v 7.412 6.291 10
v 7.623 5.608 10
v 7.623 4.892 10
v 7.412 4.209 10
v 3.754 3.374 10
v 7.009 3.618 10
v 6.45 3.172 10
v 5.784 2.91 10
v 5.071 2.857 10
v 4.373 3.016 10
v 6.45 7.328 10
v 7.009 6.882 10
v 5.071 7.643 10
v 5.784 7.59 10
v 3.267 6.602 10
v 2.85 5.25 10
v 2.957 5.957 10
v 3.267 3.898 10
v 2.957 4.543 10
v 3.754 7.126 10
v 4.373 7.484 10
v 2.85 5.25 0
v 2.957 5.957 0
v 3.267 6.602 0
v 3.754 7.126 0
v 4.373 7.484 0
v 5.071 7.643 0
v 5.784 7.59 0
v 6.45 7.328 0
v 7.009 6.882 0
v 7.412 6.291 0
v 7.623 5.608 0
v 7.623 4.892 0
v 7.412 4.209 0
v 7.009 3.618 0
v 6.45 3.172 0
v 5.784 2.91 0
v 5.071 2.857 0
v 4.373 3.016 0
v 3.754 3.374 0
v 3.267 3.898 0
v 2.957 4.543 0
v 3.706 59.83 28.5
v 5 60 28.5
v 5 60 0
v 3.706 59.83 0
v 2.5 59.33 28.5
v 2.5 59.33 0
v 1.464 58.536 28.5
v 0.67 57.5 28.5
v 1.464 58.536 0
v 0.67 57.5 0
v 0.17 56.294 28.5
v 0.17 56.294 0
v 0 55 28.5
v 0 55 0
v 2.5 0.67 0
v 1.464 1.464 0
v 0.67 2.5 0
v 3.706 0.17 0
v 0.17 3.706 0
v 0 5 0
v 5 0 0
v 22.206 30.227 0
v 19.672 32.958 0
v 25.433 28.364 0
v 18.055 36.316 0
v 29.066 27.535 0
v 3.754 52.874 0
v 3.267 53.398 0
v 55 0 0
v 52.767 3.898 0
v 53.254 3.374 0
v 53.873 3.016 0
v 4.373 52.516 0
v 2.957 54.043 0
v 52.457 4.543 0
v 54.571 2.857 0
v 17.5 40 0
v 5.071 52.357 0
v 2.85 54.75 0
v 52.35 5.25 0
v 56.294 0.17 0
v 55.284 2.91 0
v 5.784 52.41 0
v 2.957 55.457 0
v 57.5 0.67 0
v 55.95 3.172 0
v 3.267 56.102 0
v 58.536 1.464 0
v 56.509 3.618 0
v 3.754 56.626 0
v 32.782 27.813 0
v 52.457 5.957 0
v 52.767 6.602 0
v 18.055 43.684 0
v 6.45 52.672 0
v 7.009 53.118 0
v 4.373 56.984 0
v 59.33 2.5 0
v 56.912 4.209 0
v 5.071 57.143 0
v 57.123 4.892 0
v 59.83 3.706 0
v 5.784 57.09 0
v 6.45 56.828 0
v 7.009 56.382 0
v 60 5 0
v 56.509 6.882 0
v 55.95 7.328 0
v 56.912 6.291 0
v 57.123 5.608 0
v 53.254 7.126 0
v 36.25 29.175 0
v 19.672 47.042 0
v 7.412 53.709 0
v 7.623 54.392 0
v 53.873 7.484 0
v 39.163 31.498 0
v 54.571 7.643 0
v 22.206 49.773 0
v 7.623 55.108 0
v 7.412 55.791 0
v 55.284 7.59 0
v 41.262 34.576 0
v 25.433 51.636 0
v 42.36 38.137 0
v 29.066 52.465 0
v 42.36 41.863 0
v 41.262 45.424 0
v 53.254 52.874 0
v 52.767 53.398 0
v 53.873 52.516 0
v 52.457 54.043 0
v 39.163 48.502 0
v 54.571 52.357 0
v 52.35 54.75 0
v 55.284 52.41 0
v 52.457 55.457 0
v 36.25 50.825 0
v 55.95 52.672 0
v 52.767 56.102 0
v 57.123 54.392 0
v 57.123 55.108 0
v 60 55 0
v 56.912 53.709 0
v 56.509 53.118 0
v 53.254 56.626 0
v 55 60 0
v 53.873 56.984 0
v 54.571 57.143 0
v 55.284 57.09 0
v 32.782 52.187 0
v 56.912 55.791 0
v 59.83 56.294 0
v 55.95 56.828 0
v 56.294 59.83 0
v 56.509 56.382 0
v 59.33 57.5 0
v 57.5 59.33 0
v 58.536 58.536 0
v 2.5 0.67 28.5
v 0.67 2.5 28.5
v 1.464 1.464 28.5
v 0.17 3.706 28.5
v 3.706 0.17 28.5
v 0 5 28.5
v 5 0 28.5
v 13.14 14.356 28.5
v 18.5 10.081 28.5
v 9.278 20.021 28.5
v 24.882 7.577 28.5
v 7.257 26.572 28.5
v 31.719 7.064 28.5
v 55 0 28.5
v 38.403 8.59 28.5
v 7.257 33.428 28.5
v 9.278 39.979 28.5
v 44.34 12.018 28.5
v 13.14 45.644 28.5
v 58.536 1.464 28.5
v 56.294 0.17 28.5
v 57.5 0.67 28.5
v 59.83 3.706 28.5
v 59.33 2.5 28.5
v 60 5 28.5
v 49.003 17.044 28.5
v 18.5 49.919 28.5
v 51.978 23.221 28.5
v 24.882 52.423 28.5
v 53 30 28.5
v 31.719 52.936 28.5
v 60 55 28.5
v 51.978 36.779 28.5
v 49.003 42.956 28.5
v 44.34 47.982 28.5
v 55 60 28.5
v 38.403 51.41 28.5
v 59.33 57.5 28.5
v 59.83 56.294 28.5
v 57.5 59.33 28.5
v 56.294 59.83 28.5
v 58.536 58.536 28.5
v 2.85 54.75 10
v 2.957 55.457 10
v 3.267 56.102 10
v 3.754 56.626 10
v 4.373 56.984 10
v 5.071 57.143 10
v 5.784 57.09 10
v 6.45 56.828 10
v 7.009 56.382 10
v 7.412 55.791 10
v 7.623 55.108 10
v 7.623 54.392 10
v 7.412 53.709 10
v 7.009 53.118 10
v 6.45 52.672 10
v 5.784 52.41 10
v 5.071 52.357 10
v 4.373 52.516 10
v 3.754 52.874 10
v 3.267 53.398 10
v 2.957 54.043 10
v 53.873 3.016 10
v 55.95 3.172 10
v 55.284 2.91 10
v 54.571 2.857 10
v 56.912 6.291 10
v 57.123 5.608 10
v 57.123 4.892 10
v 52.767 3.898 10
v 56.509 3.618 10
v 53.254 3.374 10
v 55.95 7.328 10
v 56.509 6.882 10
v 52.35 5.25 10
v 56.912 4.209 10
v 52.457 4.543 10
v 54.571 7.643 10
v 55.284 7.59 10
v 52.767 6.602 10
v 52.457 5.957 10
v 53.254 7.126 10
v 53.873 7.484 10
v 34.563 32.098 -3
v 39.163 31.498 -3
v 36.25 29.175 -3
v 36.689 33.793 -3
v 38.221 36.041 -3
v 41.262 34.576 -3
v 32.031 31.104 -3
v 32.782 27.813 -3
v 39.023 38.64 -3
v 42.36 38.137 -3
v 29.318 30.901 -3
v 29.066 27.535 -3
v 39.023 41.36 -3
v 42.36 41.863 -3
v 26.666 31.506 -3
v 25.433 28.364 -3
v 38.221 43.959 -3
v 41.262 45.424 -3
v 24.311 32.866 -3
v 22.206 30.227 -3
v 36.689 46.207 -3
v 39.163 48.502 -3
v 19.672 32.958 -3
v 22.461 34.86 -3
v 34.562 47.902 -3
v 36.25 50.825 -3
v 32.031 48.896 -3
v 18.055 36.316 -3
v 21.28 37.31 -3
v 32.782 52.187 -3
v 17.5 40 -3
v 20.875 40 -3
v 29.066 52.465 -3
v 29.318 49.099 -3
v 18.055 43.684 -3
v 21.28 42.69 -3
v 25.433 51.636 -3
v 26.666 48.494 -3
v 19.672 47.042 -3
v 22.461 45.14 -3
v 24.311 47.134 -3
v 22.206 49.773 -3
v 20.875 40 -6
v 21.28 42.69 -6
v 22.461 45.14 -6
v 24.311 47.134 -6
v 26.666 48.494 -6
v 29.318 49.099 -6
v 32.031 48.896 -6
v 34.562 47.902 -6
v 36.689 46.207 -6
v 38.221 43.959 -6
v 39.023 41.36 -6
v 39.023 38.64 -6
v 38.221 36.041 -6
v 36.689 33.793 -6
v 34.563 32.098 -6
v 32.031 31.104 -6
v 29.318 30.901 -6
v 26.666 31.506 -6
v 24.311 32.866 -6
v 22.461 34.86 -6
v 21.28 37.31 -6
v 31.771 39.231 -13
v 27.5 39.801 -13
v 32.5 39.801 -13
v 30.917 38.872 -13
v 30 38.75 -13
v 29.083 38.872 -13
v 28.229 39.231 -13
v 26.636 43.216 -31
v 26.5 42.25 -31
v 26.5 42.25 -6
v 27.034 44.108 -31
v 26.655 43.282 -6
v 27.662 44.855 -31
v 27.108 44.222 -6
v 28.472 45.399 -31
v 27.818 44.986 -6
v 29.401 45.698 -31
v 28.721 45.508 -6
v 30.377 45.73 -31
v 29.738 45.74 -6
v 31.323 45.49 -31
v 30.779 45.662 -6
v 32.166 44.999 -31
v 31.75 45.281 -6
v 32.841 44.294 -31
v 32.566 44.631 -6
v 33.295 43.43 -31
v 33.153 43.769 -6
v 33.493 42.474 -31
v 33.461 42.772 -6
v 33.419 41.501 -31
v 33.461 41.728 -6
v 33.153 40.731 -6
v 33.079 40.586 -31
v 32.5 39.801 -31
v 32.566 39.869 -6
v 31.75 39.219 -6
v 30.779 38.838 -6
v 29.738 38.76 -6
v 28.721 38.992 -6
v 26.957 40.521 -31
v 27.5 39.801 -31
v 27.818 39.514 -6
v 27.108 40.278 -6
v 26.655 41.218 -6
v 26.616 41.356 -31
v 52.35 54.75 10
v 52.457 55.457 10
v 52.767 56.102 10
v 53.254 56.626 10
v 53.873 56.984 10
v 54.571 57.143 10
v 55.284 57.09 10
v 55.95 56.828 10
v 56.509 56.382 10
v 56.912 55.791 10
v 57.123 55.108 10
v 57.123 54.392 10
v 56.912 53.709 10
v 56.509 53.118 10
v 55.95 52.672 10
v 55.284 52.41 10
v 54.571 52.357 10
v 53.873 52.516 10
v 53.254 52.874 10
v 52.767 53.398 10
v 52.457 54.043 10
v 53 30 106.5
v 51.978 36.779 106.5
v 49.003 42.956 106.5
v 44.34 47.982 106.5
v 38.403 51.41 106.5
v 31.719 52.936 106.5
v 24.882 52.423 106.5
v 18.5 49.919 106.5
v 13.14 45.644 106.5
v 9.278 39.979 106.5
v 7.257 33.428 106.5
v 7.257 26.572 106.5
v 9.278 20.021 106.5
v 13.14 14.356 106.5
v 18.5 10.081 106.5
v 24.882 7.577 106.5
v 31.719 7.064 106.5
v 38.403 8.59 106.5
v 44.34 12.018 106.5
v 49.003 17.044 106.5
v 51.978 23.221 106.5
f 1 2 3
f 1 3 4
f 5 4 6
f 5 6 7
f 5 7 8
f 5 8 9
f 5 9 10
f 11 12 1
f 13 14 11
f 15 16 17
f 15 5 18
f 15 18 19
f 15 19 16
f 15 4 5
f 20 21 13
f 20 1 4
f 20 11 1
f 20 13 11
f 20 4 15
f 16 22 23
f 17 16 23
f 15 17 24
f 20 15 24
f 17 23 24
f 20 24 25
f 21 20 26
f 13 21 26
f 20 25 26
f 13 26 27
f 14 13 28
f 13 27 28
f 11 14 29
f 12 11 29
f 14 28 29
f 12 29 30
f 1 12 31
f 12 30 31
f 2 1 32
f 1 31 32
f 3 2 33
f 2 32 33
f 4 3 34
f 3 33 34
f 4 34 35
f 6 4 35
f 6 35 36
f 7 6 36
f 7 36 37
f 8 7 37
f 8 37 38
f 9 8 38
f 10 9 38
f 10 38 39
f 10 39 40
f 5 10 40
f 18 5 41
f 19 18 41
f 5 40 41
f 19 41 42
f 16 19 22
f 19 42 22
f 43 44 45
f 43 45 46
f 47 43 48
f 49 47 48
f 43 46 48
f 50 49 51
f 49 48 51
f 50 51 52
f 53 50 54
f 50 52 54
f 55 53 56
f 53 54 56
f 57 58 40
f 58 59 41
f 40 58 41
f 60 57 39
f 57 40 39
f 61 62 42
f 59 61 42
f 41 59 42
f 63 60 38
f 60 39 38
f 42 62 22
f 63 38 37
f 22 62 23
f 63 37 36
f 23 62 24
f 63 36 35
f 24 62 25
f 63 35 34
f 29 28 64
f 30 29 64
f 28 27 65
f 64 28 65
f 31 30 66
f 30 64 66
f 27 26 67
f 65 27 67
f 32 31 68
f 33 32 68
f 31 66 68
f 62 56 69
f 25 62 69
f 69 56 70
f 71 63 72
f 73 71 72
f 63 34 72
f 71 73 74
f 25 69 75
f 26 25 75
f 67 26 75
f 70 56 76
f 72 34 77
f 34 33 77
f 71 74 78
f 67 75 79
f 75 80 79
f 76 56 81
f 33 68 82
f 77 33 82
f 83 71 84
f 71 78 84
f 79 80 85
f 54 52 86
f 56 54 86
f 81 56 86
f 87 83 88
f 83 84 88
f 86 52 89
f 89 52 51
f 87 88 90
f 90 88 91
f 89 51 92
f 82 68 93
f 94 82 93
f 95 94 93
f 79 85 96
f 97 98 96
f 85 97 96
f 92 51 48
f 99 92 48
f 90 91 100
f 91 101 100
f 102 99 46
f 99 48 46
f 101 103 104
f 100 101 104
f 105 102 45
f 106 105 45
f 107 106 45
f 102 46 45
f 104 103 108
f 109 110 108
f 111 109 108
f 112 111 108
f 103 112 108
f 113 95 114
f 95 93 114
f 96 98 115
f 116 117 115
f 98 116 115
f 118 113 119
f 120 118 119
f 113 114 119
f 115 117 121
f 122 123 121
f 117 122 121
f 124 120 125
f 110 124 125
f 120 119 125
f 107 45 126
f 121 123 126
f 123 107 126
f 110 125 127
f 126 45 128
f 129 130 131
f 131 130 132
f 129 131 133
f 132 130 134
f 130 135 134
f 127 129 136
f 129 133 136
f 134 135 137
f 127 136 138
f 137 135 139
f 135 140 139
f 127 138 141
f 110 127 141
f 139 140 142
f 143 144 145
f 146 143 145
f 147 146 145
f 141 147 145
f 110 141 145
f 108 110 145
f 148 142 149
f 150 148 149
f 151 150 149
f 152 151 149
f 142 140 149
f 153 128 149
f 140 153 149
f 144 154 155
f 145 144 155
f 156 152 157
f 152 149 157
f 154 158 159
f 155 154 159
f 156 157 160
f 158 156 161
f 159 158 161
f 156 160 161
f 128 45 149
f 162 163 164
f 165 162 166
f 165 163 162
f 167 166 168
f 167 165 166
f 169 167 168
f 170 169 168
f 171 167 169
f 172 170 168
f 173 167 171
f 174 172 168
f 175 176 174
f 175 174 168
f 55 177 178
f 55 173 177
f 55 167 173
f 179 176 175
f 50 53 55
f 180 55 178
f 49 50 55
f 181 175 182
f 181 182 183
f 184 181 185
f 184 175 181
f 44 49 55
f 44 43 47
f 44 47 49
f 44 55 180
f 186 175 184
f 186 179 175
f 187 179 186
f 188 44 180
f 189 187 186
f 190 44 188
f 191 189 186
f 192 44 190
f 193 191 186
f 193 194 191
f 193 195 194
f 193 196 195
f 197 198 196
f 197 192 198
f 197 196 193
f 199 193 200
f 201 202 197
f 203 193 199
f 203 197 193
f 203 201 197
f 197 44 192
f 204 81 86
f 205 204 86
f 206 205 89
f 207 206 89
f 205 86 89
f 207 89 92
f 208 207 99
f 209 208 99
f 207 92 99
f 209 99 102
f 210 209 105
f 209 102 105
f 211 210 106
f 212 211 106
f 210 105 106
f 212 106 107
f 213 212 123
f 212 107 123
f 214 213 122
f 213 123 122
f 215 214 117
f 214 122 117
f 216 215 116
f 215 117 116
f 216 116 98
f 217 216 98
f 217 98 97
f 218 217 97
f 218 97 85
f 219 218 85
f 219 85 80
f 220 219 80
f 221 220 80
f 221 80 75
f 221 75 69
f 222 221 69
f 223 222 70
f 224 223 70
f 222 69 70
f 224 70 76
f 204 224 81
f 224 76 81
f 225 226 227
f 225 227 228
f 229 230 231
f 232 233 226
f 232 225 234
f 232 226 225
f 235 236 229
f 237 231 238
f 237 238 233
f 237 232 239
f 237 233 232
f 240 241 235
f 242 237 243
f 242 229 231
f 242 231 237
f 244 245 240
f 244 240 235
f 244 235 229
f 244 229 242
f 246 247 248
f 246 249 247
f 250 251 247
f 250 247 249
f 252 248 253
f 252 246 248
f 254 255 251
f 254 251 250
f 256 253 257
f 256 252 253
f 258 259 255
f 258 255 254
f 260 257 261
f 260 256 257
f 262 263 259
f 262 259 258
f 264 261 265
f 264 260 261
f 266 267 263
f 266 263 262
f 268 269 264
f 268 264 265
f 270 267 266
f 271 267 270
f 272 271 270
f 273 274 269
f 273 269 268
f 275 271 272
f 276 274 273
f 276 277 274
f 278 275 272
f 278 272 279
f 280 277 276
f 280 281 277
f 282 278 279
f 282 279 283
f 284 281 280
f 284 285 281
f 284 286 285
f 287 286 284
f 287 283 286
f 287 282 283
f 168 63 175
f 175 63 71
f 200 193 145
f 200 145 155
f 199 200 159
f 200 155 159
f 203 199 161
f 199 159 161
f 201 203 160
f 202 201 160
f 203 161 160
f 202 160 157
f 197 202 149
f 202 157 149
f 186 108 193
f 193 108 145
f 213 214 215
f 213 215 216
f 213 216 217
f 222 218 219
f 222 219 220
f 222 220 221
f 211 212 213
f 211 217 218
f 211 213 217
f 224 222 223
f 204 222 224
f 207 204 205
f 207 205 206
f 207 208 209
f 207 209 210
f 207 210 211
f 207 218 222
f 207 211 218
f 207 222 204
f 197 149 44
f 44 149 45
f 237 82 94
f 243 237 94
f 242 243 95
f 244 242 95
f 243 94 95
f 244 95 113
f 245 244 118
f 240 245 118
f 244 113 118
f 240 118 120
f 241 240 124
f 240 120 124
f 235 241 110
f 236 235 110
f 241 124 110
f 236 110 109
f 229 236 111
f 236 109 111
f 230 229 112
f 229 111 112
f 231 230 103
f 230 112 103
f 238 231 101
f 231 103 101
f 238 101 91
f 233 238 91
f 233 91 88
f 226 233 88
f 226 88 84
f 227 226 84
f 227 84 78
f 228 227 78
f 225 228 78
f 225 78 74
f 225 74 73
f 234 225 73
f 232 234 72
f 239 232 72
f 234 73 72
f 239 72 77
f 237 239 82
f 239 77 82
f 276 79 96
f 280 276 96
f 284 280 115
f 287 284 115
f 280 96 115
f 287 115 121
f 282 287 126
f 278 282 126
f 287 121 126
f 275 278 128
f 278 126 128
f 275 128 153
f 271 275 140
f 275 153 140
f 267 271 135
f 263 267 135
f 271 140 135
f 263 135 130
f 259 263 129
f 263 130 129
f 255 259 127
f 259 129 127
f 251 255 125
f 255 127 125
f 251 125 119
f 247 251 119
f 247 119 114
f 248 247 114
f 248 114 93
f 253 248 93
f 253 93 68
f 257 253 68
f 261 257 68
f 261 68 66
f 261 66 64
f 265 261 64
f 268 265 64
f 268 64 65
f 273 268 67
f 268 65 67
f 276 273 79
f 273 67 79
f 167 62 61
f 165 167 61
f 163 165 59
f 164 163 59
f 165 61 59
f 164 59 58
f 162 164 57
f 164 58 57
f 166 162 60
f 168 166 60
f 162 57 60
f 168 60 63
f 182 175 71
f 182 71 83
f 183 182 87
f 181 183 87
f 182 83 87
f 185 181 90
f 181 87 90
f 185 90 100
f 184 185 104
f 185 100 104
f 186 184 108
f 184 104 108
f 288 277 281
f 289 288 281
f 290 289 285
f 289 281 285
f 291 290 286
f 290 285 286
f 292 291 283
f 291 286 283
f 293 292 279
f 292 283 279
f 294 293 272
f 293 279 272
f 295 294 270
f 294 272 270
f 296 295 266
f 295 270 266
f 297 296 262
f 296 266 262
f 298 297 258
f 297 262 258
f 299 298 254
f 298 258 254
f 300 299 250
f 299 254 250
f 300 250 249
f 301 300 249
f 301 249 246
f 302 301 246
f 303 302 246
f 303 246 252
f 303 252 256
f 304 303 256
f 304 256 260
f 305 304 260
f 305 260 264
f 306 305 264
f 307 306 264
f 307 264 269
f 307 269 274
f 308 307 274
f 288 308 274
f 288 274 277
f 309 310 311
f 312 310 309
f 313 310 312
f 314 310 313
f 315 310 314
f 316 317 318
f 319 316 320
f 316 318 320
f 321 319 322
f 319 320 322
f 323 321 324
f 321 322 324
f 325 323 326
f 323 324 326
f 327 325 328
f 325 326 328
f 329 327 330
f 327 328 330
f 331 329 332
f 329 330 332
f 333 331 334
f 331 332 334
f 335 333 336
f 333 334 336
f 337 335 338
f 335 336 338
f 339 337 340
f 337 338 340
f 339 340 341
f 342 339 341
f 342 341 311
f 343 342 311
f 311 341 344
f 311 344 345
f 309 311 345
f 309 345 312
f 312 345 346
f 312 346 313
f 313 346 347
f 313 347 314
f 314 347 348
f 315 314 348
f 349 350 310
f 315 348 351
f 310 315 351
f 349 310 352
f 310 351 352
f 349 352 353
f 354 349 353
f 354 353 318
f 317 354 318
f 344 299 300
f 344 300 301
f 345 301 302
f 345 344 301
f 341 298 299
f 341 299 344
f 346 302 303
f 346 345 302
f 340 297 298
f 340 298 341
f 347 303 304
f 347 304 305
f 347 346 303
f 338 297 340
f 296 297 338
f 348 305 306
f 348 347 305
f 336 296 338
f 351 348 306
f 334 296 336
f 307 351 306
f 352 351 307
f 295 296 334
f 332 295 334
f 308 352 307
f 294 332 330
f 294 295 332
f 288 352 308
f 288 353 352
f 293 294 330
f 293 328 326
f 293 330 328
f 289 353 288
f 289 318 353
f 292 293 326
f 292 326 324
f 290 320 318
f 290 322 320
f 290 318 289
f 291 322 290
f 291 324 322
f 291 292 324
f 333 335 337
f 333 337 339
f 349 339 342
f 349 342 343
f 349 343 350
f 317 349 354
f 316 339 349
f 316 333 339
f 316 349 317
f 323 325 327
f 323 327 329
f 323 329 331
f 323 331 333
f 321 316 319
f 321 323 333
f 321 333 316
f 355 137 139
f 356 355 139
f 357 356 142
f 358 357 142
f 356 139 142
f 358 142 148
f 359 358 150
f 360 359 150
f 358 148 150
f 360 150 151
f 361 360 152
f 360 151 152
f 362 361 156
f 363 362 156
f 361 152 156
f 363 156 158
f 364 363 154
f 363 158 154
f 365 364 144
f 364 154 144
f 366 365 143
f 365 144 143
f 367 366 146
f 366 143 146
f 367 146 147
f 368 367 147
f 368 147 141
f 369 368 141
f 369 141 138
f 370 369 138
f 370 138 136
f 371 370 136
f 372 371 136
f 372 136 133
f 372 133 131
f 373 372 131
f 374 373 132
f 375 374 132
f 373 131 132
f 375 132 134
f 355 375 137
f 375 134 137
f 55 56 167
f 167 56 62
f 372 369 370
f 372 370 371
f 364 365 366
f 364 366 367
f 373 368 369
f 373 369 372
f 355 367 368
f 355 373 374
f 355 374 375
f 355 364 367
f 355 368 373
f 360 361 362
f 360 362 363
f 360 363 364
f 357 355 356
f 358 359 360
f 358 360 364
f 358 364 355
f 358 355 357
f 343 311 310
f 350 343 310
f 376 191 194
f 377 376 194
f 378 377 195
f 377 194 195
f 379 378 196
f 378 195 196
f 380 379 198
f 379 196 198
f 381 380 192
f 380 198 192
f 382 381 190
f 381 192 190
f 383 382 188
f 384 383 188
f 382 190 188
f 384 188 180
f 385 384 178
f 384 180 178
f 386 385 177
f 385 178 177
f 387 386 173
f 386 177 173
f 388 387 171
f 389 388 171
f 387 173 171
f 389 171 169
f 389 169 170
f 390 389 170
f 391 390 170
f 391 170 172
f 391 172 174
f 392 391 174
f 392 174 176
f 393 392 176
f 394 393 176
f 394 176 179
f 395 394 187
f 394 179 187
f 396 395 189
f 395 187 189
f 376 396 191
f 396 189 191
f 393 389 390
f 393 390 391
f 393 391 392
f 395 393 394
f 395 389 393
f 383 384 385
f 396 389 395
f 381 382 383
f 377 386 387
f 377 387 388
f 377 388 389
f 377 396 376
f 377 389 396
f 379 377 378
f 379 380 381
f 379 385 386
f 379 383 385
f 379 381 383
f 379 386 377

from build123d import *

# Parameters (mm, degrees)
BOSS_EXTRUDE1_DEPTH = 28.5
SKETCH2_R           = 23
BOSS_EXTRUDE2_DEPTH = 78
SKETCH3_R           = 9.125
BOSS_EXTRUDE3_DEPTH = 6
SKETCH4_R           = 3.5
BOSS_EXTRUDE4_DEPTH = 25
CUT_EXTRUDE1_START  = -18
CUT_EXTRUDE1_DEPTH  = 18
SKETCH6_R           = 2.4
CUT_EXTRUDE2_DEPTH  = 10
SKETCH7_R           = 12.5
SKETCH7_R_2         = 9.125
BOSS_EXTRUDE5_DEPTH = 3


with BuildPart() as part:
    # Sketch1 → Boss-Extrude1 (new body)
    with BuildSketch(Plane.XY):
        with BuildLine():
            Line((5, 0), (55, 0))
            ThreePointArc((55, 0), (58.535533906, 1.464466094), (60, 5))
            Line((60, 5), (60, 55))
            ThreePointArc((60, 55), (58.535533906, 58.535533906), (55, 60))
            Line((55, 60), (5, 60))
            ThreePointArc((5, 60), (1.464466094, 58.535533906), (0, 55))
            Line((0, 55), (0, 5))
            ThreePointArc((0, 5), (1.464466094, 1.464466094), (5, 0))
        make_face()
    extrude(amount=BOSS_EXTRUDE1_DEPTH)

    # Sketch2 → Boss-Extrude2 (add)
    with BuildSketch(Plane.XY.offset(28.5)):
        with Locations((30, 30)):
            Circle(SKETCH2_R)
    extrude(amount=BOSS_EXTRUDE2_DEPTH)

    # Sketch3 → Boss-Extrude3 (add)
    with BuildSketch(Plane(origin=(0, 0, 0), x_dir=(-1, 0, 0), z_dir=(0, 0, -1))):
        with Locations((-30, 40)):
            Circle(SKETCH3_R)
    extrude(amount=BOSS_EXTRUDE3_DEPTH)

    # Sketch4 → Boss-Extrude4 (add)
    with BuildSketch(Plane(origin=(0, 0, -6), x_dir=(-1, 0, 0), z_dir=(0, 0, -1))):
        with Locations((-30, 42.25)):
            Circle(SKETCH4_R)
    extrude(amount=BOSS_EXTRUDE4_DEPTH)

    # Sketch5 → Cut-Extrude1 (cut)
    with BuildSketch(Plane(origin=(0, 0, -31), x_dir=(-1, 0, 0), z_dir=(0, 0, -1)).offset(CUT_EXTRUDE1_START)):
        with BuildLine():
            Line((-32.5, 39.800510257), (-27.5, 39.800510257))
            ThreePointArc((-27.5, 39.800510257), (-30, 38.75), (-32.5, 39.800510257))
        make_face()
    extrude(amount=CUT_EXTRUDE1_DEPTH, mode=Mode.SUBTRACT)

    # Sketch6 → Cut-Extrude2 (cut)
    with BuildSketch(Plane(origin=(0, 0, 0), x_dir=(-1, 0, 0), z_dir=(0, 0, -1))):
        with Locations((-54.75, 54.75)):
            Circle(SKETCH6_R)
        with Locations((-5.25, 54.75)):
            Circle(SKETCH6_R)
        with Locations((-5.25, 5.25)):
            Circle(SKETCH6_R)
        with Locations((-54.75, 5.25)):
            Circle(SKETCH6_R)
    extrude(amount=-CUT_EXTRUDE2_DEPTH, mode=Mode.SUBTRACT)

    # Sketch7 → Boss-Extrude5 (add)
    with BuildSketch(Plane(origin=(0, 0, 0), x_dir=(-1, 0, 0), z_dir=(0, 0, -1))):
        with Locations((-30, 40)):
            Circle(SKETCH7_R)
        with Locations((-30, 40)):
            Circle(SKETCH7_R_2, mode=Mode.SUBTRACT)
    extrude(amount=BOSS_EXTRUDE5_DEPTH)


solid = part.part
